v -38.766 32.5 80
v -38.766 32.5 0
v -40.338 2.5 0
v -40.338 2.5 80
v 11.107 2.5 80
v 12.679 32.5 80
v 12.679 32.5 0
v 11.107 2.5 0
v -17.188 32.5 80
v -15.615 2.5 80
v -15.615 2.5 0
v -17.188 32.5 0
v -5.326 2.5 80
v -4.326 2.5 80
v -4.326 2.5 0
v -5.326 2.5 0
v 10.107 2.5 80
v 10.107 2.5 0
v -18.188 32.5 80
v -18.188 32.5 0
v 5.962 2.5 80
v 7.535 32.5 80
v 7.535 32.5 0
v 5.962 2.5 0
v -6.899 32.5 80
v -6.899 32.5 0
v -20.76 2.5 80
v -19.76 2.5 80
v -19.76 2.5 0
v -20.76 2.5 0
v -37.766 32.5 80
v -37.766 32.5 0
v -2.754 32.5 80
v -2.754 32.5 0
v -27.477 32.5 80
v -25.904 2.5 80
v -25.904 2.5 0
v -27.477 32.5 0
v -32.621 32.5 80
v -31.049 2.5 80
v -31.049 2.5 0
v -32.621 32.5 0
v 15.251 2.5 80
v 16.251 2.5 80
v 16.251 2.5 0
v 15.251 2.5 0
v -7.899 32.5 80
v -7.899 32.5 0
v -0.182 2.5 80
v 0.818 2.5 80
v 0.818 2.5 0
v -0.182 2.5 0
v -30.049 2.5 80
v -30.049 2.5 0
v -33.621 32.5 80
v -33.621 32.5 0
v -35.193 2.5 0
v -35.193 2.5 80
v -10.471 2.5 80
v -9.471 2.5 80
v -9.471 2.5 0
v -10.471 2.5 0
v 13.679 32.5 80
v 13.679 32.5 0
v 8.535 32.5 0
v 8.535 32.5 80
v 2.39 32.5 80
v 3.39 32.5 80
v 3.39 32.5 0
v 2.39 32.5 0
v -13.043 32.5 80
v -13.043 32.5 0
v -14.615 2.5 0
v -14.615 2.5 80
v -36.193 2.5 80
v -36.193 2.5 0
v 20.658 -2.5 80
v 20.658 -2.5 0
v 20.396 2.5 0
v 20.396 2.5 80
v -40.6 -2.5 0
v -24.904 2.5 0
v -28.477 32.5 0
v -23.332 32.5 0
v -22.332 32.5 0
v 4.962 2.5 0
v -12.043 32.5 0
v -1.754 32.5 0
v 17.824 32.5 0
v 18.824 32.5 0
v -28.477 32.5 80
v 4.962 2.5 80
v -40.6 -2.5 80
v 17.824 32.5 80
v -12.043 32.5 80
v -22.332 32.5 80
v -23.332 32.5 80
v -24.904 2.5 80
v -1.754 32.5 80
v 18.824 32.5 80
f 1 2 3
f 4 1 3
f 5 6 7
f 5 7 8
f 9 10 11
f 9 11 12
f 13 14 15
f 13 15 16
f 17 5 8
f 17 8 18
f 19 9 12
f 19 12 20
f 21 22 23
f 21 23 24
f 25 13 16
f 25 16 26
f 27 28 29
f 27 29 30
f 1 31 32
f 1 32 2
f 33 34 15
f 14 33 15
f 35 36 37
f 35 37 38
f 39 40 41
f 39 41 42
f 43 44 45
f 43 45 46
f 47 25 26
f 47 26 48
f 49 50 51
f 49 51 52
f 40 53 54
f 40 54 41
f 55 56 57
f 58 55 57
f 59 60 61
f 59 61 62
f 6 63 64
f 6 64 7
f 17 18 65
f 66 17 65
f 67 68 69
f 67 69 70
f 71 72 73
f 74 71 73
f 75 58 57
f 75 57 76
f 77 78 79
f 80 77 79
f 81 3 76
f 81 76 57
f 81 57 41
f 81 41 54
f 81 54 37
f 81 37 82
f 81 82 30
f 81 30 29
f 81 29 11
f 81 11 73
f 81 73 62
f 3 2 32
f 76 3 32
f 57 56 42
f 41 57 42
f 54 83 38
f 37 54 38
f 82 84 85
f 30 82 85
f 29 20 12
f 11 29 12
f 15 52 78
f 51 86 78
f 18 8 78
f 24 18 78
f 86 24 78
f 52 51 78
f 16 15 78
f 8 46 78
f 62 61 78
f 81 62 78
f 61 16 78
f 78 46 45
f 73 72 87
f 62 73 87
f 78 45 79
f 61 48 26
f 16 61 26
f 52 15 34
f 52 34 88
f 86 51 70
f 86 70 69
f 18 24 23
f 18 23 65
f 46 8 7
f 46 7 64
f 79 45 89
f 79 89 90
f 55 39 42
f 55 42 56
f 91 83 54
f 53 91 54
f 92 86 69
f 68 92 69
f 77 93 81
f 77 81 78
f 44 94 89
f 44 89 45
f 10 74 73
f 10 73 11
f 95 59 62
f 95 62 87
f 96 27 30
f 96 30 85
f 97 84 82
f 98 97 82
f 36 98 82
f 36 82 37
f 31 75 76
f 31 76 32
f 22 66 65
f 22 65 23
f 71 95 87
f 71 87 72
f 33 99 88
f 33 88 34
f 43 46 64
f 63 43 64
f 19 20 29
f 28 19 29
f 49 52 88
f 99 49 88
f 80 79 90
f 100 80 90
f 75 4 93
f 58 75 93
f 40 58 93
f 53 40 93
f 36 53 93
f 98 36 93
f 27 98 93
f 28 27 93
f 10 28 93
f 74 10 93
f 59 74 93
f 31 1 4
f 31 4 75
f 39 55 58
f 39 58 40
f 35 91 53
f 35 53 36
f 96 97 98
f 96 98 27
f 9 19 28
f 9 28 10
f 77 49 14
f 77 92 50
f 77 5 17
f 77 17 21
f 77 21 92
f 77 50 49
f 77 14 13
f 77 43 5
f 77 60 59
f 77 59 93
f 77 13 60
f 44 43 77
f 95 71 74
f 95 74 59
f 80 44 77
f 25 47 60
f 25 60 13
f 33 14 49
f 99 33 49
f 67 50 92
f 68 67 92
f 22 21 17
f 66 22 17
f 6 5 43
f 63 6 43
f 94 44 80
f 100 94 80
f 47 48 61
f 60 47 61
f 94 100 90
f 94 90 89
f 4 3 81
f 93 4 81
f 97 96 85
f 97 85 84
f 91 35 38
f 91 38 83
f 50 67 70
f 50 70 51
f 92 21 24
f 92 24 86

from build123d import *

# Parameters (mm, degrees)
BOSS_EXTRUDE1_DEPTH = 80


with BuildPart() as part:
    # Sketch2 → Boss-Extrude1 (new body)
    with BuildSketch(Plane.XY):
        Polygon((-20.657894737, -2.5), (20.657894737, -2.5), (20.39585584, 2.5), (18.823622462, 32.5), (17.823622462, 32.5), (16.251389083, 2.5), (15.251389083, 2.5), (13.679155705, 32.5), (12.679155705, 32.5), (11.106922326, 2.5), (10.106922326, 2.5), (8.534688948, 32.5), (7.534688948, 32.5), (5.962455569, 2.5), (4.962455569, 2.5), (3.390222191, 32.5), (2.390222191, 32.5), (0.817988812, 2.5), (-0.182011188, 2.5), (-1.754244566, 32.5), (-2.754244566, 32.5), (-4.326477944, 2.5), (-5.326477944, 2.5), (-6.898711323, 32.5), (-7.898711323, 32.5), (-9.470944701, 2.5), (-10.470944701, 2.5), (-12.04317808, 32.5), (-13.04317808, 32.5), (-14.615411458, 2.5), (-15.615411458, 2.5), (-17.187644837, 32.5), (-18.187644837, 32.5), (-19.759878215, 2.5), (-20.759878215, 2.5), (-22.332111594, 32.5), (-23.332111594, 32.5), (-24.904344972, 2.5), (-25.904344972, 2.5), (-27.476578351, 32.5), (-28.476578351, 32.5), (-30.048811729, 2.5), (-31.048811729, 2.5), (-32.621045108, 32.5), (-33.621045108, 32.5), (-35.193278486, 2.5), (-36.193278486, 2.5), (-37.765511865, 32.5), (-38.765511865, 32.5), (-40.337745243, 2.5), (-40.59978414, -2.5), align=None)
    extrude(amount=BOSS_EXTRUDE1_DEPTH)


solid = part.part
